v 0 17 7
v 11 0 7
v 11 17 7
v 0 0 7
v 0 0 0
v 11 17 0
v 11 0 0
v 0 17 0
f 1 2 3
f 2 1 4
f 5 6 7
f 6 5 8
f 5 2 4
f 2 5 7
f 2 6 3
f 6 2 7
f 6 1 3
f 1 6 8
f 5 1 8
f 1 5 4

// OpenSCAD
// Generated by SolidPython 1.0.1 on 2020-07-29 00:46:55


cube(size = [11, 17, 7]);
/***********************************************
*********      SolidPython code:      **********
************************************************
 
# import packages: SolidPython
from solid import *
from solid.utils import *
from itertools import chain, combinations, permutations


class Resize:

    def __init__(self, scad_file):
        self.scad_file = scad_file
        #self.scad_file = import_scad(scad_file)
        # cone/cylinder param:
        self.r1 = 0
        self.r2 = 0
        self.h = 0
        # rectangular prism param:
        self.w = 0
        self.l = 0
        # ellipse param:
        self.r = 0

    # import OpenScad code (file name corresponds to shape)


    # classify shape + parameters
    def assign(self, param1, param2, param3):
        if self.scad_file == 'cone.scad':
            self.r1 = param1
            self.r2 = param2
            self.h = param3
        elif self.scad_file == 'cylinder.scad':
            self.r1 = param1
            self.r2 = param2
            self.h = param3
        elif self.scad_file == 'rectangularPrism.scad':
            self.h = param1
            self.l = param2
            self.w = param3
        else:
            self.r = param1
            self.h = param2

    # resize parameters
    def iterate(self):
        x = range(3, 20, 2)
        i = 1
        if self.scad_file == 'cone.scad':
            tempList = list(permutations(x, 2))
            for temp in tempList:
                param1 = temp[0]
                param2 = temp[1]
                filepath = 'produced_scad_files/' + 'cone' + str(param1) + '_' + str(param2) + '_' + '.scad'
                scad_render_to_file(cylinder(h=param1, r1=param2, r2=0), filepath)

        elif self.scad_file == 'cylinder.scad':
            tempList = list(permutations(x, 3))
            for temp in tempList:
                param1 = temp[0]
                param2 = temp[1]
                filepath = 'produced_scad_files/' + 'cylinder' + str(param1) + '_' + str(param2) + '_' + '.scad'
                scad_render_to_file(cylinder(h=param1, r1=param2, r2=param2), filepath)

        elif self.scad_file == 'rectangularPrism.scad':
            tempList = list(permutations(x, 3))
            for temp in tempList:
                param1 = temp[0]
                param2 = temp[1]
                param3 = temp[2]
                filepath = 'produced_scad_files/' + 'rectangularPrism' + str(param1) + '_' + str(param2) + '_' + str(
                    param3) + '.scad'
                scad_render_to_file(cube(size=(param1, param2, param3)), filepath)

        elif self.scad_file == 'ellipse.scad':
            tempList = list(permutations(x, 4))
            for temp in tempList:
                param1 = temp[0]
                param2 = temp[1]
                param3 = temp[2]
                param4 = temp[3]
                filepath = 'produced_scad_files/' + 'ellipse' + str(param1) + '_' + str(param2) + '_' + str(param3) + '_' + str(param4) + '.scad'
                scad_render_to_file(scale([param1, param2, param3])(sphere(r=param4)), filepath)

    def render_to_scadfile(self):
        scad_render_to_file(scad, 'example.scad') 
 
************************************************/
